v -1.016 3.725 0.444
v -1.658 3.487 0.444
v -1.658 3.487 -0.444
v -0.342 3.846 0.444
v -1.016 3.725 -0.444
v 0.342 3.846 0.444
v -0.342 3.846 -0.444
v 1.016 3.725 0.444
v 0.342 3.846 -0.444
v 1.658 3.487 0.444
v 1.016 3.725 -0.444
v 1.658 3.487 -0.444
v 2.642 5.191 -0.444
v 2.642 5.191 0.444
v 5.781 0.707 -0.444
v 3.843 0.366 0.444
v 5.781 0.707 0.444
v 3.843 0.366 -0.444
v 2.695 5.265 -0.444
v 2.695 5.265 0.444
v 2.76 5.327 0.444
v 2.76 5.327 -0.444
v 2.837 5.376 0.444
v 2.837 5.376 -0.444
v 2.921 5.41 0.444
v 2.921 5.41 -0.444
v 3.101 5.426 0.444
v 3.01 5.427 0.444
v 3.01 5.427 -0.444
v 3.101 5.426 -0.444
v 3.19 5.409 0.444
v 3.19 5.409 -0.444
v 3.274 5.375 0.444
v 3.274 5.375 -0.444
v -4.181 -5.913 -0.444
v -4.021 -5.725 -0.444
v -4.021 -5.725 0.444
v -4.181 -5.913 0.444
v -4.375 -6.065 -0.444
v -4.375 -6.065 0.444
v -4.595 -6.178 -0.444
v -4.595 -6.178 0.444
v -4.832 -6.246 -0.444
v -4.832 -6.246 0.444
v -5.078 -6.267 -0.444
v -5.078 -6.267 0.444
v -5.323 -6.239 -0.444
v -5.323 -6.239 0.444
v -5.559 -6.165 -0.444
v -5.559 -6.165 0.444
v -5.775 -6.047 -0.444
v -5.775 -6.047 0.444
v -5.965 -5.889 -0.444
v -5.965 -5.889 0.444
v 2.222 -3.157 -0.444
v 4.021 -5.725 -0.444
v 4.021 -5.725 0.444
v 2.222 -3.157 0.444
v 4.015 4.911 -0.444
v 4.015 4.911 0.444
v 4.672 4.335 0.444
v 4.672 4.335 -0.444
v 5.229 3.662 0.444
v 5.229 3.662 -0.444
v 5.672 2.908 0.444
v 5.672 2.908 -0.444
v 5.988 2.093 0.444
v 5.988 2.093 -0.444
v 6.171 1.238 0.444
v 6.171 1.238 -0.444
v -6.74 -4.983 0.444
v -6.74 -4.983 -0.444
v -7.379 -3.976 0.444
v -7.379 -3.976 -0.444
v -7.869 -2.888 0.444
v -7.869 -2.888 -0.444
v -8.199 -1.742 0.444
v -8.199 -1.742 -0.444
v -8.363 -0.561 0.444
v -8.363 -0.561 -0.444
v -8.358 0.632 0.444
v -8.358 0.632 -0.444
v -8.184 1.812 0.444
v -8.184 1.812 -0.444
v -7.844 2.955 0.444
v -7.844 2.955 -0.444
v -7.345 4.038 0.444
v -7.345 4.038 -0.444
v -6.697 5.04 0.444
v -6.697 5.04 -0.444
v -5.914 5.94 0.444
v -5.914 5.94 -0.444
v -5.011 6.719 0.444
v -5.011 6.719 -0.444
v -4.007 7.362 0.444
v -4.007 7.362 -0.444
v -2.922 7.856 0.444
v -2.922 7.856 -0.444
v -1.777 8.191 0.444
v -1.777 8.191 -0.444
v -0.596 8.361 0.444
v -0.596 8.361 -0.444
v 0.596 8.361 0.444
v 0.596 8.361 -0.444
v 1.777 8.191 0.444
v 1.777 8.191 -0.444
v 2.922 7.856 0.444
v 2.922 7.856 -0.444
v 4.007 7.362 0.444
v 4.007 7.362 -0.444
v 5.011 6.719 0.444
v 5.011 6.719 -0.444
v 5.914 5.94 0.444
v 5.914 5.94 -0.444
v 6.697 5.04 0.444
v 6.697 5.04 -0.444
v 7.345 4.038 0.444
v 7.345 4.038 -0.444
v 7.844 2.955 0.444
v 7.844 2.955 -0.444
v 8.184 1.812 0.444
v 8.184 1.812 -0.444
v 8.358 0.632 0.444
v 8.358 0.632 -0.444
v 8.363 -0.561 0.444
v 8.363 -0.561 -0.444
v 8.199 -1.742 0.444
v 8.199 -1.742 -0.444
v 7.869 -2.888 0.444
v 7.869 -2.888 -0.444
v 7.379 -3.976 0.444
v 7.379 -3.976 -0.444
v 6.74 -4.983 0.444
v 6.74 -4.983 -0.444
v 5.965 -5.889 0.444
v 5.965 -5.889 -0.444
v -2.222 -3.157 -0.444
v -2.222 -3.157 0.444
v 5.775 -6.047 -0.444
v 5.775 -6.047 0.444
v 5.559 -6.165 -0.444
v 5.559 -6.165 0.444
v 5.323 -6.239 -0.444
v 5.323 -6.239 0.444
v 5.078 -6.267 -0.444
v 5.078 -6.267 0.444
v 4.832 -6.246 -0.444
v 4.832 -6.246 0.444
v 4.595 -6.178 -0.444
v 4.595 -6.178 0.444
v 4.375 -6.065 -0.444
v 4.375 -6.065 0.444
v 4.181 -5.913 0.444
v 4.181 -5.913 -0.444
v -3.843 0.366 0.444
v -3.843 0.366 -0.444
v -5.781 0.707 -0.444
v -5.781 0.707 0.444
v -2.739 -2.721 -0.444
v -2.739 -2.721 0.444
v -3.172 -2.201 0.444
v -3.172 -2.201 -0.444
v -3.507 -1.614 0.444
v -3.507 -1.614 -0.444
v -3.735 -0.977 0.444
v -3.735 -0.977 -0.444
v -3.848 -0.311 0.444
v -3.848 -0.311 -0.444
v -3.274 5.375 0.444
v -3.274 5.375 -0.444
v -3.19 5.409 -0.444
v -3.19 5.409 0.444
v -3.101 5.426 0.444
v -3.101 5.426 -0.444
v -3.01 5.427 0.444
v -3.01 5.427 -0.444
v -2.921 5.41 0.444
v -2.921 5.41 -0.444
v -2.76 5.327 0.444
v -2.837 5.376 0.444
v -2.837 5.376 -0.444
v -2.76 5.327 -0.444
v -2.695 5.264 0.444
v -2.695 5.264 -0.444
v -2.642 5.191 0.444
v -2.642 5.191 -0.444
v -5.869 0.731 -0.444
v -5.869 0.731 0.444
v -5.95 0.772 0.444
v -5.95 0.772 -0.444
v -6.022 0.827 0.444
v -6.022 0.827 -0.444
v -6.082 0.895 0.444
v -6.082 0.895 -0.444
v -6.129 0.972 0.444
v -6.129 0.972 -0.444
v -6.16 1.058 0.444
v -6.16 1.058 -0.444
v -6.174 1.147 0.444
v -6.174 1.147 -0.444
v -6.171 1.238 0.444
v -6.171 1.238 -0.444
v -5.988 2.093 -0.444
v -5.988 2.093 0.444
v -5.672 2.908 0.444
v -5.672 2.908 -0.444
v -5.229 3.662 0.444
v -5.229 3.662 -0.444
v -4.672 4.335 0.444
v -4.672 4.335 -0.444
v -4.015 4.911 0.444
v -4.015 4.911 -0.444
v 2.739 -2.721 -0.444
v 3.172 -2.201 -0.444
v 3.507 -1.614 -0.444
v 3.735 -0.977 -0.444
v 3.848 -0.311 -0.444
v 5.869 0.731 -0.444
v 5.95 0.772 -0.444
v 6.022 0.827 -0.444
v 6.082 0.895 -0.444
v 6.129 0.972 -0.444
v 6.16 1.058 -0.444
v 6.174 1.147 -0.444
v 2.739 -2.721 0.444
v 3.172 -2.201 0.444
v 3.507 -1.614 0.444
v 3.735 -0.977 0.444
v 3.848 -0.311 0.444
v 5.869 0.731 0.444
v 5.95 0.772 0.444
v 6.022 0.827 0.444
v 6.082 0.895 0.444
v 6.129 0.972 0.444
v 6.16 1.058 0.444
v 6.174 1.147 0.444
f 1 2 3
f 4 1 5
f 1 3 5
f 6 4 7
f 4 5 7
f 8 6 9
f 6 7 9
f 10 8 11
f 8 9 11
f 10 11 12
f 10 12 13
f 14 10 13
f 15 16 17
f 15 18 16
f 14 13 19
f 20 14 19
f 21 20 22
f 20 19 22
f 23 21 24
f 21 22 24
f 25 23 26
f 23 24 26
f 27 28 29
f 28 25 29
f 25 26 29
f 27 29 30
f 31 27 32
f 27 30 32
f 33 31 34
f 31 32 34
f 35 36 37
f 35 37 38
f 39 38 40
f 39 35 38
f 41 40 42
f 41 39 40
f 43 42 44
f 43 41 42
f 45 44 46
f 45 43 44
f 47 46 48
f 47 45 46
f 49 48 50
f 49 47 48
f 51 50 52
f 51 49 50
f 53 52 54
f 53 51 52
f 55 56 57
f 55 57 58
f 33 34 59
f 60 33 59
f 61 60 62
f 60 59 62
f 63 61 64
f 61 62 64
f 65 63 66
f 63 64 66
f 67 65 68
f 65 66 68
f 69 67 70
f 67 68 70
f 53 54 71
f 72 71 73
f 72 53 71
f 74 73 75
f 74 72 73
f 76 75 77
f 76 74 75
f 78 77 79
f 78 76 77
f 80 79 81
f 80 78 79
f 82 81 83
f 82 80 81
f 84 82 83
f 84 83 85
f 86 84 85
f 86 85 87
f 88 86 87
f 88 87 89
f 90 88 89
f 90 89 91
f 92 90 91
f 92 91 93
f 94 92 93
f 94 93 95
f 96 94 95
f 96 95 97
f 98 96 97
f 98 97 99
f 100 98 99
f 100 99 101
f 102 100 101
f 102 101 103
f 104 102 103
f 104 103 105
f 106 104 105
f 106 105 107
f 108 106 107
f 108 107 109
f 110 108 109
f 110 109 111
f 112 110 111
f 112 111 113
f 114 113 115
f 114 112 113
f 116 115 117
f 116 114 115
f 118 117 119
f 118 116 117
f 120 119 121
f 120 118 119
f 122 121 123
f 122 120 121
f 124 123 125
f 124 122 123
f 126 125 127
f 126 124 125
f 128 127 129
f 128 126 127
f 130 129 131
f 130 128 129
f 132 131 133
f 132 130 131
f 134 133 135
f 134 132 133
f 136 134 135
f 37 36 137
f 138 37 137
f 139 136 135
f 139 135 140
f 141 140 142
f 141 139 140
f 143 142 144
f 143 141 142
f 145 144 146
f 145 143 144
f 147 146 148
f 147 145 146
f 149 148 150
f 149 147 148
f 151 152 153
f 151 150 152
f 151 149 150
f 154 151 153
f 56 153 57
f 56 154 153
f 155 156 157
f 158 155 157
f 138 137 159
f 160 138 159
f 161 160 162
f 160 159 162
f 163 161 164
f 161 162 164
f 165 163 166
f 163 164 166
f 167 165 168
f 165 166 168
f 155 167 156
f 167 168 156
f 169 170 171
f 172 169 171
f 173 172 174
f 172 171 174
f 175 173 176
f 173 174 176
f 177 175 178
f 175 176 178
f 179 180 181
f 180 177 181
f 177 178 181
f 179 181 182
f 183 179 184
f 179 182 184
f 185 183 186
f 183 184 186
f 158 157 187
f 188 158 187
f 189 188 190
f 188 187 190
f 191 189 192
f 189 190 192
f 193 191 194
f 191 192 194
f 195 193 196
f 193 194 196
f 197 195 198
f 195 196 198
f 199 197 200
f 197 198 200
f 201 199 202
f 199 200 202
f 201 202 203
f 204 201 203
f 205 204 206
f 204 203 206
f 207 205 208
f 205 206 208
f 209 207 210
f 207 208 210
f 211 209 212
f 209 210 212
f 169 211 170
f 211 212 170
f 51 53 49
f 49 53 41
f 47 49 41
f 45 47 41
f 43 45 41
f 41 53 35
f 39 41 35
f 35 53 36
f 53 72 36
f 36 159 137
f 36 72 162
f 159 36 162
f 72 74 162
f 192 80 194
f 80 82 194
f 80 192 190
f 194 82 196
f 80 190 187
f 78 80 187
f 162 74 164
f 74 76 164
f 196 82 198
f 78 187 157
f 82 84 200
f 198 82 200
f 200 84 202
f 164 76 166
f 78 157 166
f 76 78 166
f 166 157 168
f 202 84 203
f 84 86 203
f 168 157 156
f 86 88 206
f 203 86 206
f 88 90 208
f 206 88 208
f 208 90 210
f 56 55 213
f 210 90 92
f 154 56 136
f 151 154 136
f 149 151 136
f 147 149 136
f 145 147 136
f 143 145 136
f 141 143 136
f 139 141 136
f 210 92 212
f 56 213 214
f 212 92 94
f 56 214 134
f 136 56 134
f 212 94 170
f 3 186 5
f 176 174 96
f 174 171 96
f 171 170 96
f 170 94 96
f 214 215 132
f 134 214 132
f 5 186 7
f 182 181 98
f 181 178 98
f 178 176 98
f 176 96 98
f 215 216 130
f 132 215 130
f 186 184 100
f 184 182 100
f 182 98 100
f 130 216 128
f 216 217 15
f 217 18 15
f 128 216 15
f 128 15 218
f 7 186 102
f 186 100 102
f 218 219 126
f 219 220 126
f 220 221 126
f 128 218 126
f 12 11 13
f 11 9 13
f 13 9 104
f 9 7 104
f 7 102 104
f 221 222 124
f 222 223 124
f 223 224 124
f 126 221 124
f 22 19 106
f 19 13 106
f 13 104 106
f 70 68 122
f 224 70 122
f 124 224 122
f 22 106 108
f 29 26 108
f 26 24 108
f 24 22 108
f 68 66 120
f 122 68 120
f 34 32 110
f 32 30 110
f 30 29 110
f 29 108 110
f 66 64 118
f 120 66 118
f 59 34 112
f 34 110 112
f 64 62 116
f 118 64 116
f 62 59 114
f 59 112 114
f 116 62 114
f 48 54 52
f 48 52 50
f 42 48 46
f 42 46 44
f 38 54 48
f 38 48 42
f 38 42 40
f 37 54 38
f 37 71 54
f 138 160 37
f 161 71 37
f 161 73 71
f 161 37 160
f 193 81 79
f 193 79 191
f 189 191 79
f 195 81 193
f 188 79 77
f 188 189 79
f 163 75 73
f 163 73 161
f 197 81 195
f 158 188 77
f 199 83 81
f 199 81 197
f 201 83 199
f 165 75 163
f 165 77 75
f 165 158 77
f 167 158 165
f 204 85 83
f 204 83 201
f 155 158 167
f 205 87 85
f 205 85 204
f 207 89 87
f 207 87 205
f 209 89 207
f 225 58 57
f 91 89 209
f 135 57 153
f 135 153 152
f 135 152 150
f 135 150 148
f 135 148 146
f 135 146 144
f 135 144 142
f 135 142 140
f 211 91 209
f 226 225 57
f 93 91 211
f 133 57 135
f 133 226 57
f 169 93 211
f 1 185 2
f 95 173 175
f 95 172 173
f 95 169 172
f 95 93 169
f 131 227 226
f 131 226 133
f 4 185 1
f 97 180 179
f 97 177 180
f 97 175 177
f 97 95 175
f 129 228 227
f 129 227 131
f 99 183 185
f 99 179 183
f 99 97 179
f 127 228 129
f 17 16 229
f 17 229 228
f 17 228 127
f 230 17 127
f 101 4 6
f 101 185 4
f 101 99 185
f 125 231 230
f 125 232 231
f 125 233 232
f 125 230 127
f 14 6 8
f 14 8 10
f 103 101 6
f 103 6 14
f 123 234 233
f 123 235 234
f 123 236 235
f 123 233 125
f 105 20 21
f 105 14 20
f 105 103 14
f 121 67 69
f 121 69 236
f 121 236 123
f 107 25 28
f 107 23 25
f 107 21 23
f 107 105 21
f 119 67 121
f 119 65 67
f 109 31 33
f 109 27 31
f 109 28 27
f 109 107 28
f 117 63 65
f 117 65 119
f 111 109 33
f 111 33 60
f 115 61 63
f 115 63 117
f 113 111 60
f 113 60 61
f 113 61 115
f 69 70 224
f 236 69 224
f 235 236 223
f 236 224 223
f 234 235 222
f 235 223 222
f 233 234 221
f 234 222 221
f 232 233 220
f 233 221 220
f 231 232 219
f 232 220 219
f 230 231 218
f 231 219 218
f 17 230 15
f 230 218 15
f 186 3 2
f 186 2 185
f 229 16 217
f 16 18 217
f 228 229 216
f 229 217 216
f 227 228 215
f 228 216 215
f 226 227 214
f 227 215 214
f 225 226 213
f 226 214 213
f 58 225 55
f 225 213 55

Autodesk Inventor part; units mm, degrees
ref_plane "YZ Plane" through (0, 0, 0) normal (1, 0, 0) x (0, 1, 0)
ref_plane "XZ Plane" through (0, 0, 0) normal (0, 1, 0) x (-1, 0, 0)
ref_plane "XY Plane" through (0, 0, 0) normal (0, 0, 1) x (1, 0, 0)
sketch "Sketch1" plane through (0, 0, 0) normal (0, 0, 1) x (1, 0, 0)
  line L0 (-11.7348, 0) -> (11.7348, 0) projected
  line L1 (0, -9.2893) -> (0, 11.3272) projected
  arc A0 (5.9648, -5.8889) -> (-5.9648, -5.8889) centre (0, 0) ccw
  arc A1 (-5.9648, -5.8889) -> (-4.0207, -5.7251) centre (-5.061, -4.9966) ccw
  arc A2 (4.0207, -5.7251) -> (5.9648, -5.8889) centre (5.061, -4.9966) ccw
  line L2 (0, 0) -> (-6.8661, 4.8077) construction
  line L3 (0, 0) -> (6.8661, 4.8077) construction
  line L4 (4.0207, -5.7251) -> (2.2225, -3.1569)
  line L5 (-4.0207, -5.7251) -> (-2.2225, -3.1569)
  line L6 (1.6581, 3.4866) -> (2.642, 5.1906)
  line L7 (-1.6581, 3.4866) -> (-2.642, 5.1906)
  line L8 (-3.8434, 0.3656) -> (-5.7812, 0.7073)
  line L9 (3.8434, 0.3656) -> (5.7812, 0.7073)
  arc A3 (-3.274, 5.3751) -> (-6.1707, 1.2381) centre (-0.7559, 0.5293) ccw
  arc A4 (6.1707, 1.2381) -> (3.274, 5.3751) centre (0.7559, 0.5293) ccw
  arc A5 (-2.642, 5.1906) -> (-3.274, 5.3751) centre (-3.0544, 4.9525) ccw
  arc A6 (-6.1707, 1.2381) -> (-5.7812, 0.7073) centre (-5.6985, 1.1763) ccw
  arc A7 (3.274, 5.3751) -> (2.642, 5.1906) centre (3.0544, 4.9525) ccw
  arc A8 (5.7812, 0.7073) -> (6.1707, 1.2381) centre (5.6985, 1.1763) ccw
  arc A9 (-3.8434, 0.3656) -> (-2.2225, -3.1569) centre (0, 0) ccw
  arc A10 (2.2225, -3.1569) -> (3.8434, 0.3656) centre (0, 0) ccw
  arc A11 (1.6581, 3.4866) -> (-1.6581, 3.4866) centre (0, 0) ccw
  point P0 (2.8602, 5.5686)
  point P1 (-2.8602, 5.5686)
  point P2 (-6.211, 0.7831)
  point P3 (6.211, 0.7831)
  dimension "d19" = 1.27
  dimension "d30" = 8.382
  dimension "d35" = 35
  dimension "d36" = 35
  dimension "d37" = 4.445
  dimension "d38" = 30
  dimension "d39" = 2.4041
  dimension "d40" = 0.4763
  dimension "d41" = 3.8608
  dimension "d42" = 3.8608
  dimension "d43" = 3.8608
  dimension "d45" = 3.81
  dimension "d46" = 5.461
extrude "Extrusion2" add sketch "Sketch1" along normal mid plane 0.889 contours A0 L1 A11 L7 A5 A3 A6 L8 A9 L0 | L0 A9 L5 A1 A0 | A0 L0 A10 L9 A8 A4 A7 L6 A11 L1 | A0 A2 L4 A10 L0
properties part number "e-clip" material "Steel, Mild"
